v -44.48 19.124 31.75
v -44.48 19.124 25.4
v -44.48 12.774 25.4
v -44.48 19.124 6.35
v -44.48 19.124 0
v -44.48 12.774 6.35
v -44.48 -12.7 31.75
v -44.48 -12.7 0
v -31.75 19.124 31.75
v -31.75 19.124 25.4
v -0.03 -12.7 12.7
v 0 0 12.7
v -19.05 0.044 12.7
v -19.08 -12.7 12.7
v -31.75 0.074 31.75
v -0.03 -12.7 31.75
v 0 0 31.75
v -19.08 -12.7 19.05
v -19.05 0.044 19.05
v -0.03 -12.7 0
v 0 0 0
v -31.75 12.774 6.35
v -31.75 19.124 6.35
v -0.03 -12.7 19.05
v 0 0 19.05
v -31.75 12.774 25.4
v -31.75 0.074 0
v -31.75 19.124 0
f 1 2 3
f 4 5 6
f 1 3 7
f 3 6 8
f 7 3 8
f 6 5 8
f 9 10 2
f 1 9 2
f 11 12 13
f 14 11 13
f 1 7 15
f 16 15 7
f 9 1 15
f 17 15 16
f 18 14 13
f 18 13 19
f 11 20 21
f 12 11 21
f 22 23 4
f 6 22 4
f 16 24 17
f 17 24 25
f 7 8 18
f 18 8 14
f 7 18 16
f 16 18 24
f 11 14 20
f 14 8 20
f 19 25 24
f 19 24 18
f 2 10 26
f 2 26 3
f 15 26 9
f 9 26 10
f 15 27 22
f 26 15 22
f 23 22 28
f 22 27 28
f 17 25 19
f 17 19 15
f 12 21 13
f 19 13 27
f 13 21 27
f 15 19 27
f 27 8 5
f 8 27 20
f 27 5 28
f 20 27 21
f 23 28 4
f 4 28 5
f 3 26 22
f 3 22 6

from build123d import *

# Parameters (mm, degrees)
F1_DEPTH = 31.75
F2_W     = 12.7296627492
F2_H     = 19.05
F3_DEPTH = 6.35
F4_W     = 19.05
F4_H     = 6.35
F5_DEPTH = 14.4526


with BuildPart() as f1:
    # F0 (on Top) → F1 (new body)
    with BuildSketch(Plane.XY):
        Polygon((-31.7499138997, 0.0739416222), (-31.7499138997, 19.1239416222), (-44.4795766489, 19.1239416222), (-44.4795766489, -12.6999655599), (-0.0295766489, -12.6999655599), (0, 0), align=None)
    extrude(amount=F1_DEPTH)

    # F2 (on face) → F3 (cut)
    with BuildSketch(Plane(origin=(0, 19.1239416222, 0), x_dir=(-1, 0, 0), z_dir=(0, 1, 0))):
        with Locations((38.1147452743, 15.875)):
            Rectangle(F2_W, F2_H)
    extrude(amount=-F3_DEPTH, mode=Mode.SUBTRACT)

    # F4 (on face) → F5 (cut)
    with BuildSketch(Plane(origin=(0, 0, 0), x_dir=(-0.9999972882, 0.00232887, 0), z_dir=(0.00232887, 0.9999972882, 0))):
        with Locations((9.525, 15.875)):
            Rectangle(F4_W, F4_H)
    extrude(amount=-F5_DEPTH, mode=Mode.SUBTRACT)


solid = f1.part
